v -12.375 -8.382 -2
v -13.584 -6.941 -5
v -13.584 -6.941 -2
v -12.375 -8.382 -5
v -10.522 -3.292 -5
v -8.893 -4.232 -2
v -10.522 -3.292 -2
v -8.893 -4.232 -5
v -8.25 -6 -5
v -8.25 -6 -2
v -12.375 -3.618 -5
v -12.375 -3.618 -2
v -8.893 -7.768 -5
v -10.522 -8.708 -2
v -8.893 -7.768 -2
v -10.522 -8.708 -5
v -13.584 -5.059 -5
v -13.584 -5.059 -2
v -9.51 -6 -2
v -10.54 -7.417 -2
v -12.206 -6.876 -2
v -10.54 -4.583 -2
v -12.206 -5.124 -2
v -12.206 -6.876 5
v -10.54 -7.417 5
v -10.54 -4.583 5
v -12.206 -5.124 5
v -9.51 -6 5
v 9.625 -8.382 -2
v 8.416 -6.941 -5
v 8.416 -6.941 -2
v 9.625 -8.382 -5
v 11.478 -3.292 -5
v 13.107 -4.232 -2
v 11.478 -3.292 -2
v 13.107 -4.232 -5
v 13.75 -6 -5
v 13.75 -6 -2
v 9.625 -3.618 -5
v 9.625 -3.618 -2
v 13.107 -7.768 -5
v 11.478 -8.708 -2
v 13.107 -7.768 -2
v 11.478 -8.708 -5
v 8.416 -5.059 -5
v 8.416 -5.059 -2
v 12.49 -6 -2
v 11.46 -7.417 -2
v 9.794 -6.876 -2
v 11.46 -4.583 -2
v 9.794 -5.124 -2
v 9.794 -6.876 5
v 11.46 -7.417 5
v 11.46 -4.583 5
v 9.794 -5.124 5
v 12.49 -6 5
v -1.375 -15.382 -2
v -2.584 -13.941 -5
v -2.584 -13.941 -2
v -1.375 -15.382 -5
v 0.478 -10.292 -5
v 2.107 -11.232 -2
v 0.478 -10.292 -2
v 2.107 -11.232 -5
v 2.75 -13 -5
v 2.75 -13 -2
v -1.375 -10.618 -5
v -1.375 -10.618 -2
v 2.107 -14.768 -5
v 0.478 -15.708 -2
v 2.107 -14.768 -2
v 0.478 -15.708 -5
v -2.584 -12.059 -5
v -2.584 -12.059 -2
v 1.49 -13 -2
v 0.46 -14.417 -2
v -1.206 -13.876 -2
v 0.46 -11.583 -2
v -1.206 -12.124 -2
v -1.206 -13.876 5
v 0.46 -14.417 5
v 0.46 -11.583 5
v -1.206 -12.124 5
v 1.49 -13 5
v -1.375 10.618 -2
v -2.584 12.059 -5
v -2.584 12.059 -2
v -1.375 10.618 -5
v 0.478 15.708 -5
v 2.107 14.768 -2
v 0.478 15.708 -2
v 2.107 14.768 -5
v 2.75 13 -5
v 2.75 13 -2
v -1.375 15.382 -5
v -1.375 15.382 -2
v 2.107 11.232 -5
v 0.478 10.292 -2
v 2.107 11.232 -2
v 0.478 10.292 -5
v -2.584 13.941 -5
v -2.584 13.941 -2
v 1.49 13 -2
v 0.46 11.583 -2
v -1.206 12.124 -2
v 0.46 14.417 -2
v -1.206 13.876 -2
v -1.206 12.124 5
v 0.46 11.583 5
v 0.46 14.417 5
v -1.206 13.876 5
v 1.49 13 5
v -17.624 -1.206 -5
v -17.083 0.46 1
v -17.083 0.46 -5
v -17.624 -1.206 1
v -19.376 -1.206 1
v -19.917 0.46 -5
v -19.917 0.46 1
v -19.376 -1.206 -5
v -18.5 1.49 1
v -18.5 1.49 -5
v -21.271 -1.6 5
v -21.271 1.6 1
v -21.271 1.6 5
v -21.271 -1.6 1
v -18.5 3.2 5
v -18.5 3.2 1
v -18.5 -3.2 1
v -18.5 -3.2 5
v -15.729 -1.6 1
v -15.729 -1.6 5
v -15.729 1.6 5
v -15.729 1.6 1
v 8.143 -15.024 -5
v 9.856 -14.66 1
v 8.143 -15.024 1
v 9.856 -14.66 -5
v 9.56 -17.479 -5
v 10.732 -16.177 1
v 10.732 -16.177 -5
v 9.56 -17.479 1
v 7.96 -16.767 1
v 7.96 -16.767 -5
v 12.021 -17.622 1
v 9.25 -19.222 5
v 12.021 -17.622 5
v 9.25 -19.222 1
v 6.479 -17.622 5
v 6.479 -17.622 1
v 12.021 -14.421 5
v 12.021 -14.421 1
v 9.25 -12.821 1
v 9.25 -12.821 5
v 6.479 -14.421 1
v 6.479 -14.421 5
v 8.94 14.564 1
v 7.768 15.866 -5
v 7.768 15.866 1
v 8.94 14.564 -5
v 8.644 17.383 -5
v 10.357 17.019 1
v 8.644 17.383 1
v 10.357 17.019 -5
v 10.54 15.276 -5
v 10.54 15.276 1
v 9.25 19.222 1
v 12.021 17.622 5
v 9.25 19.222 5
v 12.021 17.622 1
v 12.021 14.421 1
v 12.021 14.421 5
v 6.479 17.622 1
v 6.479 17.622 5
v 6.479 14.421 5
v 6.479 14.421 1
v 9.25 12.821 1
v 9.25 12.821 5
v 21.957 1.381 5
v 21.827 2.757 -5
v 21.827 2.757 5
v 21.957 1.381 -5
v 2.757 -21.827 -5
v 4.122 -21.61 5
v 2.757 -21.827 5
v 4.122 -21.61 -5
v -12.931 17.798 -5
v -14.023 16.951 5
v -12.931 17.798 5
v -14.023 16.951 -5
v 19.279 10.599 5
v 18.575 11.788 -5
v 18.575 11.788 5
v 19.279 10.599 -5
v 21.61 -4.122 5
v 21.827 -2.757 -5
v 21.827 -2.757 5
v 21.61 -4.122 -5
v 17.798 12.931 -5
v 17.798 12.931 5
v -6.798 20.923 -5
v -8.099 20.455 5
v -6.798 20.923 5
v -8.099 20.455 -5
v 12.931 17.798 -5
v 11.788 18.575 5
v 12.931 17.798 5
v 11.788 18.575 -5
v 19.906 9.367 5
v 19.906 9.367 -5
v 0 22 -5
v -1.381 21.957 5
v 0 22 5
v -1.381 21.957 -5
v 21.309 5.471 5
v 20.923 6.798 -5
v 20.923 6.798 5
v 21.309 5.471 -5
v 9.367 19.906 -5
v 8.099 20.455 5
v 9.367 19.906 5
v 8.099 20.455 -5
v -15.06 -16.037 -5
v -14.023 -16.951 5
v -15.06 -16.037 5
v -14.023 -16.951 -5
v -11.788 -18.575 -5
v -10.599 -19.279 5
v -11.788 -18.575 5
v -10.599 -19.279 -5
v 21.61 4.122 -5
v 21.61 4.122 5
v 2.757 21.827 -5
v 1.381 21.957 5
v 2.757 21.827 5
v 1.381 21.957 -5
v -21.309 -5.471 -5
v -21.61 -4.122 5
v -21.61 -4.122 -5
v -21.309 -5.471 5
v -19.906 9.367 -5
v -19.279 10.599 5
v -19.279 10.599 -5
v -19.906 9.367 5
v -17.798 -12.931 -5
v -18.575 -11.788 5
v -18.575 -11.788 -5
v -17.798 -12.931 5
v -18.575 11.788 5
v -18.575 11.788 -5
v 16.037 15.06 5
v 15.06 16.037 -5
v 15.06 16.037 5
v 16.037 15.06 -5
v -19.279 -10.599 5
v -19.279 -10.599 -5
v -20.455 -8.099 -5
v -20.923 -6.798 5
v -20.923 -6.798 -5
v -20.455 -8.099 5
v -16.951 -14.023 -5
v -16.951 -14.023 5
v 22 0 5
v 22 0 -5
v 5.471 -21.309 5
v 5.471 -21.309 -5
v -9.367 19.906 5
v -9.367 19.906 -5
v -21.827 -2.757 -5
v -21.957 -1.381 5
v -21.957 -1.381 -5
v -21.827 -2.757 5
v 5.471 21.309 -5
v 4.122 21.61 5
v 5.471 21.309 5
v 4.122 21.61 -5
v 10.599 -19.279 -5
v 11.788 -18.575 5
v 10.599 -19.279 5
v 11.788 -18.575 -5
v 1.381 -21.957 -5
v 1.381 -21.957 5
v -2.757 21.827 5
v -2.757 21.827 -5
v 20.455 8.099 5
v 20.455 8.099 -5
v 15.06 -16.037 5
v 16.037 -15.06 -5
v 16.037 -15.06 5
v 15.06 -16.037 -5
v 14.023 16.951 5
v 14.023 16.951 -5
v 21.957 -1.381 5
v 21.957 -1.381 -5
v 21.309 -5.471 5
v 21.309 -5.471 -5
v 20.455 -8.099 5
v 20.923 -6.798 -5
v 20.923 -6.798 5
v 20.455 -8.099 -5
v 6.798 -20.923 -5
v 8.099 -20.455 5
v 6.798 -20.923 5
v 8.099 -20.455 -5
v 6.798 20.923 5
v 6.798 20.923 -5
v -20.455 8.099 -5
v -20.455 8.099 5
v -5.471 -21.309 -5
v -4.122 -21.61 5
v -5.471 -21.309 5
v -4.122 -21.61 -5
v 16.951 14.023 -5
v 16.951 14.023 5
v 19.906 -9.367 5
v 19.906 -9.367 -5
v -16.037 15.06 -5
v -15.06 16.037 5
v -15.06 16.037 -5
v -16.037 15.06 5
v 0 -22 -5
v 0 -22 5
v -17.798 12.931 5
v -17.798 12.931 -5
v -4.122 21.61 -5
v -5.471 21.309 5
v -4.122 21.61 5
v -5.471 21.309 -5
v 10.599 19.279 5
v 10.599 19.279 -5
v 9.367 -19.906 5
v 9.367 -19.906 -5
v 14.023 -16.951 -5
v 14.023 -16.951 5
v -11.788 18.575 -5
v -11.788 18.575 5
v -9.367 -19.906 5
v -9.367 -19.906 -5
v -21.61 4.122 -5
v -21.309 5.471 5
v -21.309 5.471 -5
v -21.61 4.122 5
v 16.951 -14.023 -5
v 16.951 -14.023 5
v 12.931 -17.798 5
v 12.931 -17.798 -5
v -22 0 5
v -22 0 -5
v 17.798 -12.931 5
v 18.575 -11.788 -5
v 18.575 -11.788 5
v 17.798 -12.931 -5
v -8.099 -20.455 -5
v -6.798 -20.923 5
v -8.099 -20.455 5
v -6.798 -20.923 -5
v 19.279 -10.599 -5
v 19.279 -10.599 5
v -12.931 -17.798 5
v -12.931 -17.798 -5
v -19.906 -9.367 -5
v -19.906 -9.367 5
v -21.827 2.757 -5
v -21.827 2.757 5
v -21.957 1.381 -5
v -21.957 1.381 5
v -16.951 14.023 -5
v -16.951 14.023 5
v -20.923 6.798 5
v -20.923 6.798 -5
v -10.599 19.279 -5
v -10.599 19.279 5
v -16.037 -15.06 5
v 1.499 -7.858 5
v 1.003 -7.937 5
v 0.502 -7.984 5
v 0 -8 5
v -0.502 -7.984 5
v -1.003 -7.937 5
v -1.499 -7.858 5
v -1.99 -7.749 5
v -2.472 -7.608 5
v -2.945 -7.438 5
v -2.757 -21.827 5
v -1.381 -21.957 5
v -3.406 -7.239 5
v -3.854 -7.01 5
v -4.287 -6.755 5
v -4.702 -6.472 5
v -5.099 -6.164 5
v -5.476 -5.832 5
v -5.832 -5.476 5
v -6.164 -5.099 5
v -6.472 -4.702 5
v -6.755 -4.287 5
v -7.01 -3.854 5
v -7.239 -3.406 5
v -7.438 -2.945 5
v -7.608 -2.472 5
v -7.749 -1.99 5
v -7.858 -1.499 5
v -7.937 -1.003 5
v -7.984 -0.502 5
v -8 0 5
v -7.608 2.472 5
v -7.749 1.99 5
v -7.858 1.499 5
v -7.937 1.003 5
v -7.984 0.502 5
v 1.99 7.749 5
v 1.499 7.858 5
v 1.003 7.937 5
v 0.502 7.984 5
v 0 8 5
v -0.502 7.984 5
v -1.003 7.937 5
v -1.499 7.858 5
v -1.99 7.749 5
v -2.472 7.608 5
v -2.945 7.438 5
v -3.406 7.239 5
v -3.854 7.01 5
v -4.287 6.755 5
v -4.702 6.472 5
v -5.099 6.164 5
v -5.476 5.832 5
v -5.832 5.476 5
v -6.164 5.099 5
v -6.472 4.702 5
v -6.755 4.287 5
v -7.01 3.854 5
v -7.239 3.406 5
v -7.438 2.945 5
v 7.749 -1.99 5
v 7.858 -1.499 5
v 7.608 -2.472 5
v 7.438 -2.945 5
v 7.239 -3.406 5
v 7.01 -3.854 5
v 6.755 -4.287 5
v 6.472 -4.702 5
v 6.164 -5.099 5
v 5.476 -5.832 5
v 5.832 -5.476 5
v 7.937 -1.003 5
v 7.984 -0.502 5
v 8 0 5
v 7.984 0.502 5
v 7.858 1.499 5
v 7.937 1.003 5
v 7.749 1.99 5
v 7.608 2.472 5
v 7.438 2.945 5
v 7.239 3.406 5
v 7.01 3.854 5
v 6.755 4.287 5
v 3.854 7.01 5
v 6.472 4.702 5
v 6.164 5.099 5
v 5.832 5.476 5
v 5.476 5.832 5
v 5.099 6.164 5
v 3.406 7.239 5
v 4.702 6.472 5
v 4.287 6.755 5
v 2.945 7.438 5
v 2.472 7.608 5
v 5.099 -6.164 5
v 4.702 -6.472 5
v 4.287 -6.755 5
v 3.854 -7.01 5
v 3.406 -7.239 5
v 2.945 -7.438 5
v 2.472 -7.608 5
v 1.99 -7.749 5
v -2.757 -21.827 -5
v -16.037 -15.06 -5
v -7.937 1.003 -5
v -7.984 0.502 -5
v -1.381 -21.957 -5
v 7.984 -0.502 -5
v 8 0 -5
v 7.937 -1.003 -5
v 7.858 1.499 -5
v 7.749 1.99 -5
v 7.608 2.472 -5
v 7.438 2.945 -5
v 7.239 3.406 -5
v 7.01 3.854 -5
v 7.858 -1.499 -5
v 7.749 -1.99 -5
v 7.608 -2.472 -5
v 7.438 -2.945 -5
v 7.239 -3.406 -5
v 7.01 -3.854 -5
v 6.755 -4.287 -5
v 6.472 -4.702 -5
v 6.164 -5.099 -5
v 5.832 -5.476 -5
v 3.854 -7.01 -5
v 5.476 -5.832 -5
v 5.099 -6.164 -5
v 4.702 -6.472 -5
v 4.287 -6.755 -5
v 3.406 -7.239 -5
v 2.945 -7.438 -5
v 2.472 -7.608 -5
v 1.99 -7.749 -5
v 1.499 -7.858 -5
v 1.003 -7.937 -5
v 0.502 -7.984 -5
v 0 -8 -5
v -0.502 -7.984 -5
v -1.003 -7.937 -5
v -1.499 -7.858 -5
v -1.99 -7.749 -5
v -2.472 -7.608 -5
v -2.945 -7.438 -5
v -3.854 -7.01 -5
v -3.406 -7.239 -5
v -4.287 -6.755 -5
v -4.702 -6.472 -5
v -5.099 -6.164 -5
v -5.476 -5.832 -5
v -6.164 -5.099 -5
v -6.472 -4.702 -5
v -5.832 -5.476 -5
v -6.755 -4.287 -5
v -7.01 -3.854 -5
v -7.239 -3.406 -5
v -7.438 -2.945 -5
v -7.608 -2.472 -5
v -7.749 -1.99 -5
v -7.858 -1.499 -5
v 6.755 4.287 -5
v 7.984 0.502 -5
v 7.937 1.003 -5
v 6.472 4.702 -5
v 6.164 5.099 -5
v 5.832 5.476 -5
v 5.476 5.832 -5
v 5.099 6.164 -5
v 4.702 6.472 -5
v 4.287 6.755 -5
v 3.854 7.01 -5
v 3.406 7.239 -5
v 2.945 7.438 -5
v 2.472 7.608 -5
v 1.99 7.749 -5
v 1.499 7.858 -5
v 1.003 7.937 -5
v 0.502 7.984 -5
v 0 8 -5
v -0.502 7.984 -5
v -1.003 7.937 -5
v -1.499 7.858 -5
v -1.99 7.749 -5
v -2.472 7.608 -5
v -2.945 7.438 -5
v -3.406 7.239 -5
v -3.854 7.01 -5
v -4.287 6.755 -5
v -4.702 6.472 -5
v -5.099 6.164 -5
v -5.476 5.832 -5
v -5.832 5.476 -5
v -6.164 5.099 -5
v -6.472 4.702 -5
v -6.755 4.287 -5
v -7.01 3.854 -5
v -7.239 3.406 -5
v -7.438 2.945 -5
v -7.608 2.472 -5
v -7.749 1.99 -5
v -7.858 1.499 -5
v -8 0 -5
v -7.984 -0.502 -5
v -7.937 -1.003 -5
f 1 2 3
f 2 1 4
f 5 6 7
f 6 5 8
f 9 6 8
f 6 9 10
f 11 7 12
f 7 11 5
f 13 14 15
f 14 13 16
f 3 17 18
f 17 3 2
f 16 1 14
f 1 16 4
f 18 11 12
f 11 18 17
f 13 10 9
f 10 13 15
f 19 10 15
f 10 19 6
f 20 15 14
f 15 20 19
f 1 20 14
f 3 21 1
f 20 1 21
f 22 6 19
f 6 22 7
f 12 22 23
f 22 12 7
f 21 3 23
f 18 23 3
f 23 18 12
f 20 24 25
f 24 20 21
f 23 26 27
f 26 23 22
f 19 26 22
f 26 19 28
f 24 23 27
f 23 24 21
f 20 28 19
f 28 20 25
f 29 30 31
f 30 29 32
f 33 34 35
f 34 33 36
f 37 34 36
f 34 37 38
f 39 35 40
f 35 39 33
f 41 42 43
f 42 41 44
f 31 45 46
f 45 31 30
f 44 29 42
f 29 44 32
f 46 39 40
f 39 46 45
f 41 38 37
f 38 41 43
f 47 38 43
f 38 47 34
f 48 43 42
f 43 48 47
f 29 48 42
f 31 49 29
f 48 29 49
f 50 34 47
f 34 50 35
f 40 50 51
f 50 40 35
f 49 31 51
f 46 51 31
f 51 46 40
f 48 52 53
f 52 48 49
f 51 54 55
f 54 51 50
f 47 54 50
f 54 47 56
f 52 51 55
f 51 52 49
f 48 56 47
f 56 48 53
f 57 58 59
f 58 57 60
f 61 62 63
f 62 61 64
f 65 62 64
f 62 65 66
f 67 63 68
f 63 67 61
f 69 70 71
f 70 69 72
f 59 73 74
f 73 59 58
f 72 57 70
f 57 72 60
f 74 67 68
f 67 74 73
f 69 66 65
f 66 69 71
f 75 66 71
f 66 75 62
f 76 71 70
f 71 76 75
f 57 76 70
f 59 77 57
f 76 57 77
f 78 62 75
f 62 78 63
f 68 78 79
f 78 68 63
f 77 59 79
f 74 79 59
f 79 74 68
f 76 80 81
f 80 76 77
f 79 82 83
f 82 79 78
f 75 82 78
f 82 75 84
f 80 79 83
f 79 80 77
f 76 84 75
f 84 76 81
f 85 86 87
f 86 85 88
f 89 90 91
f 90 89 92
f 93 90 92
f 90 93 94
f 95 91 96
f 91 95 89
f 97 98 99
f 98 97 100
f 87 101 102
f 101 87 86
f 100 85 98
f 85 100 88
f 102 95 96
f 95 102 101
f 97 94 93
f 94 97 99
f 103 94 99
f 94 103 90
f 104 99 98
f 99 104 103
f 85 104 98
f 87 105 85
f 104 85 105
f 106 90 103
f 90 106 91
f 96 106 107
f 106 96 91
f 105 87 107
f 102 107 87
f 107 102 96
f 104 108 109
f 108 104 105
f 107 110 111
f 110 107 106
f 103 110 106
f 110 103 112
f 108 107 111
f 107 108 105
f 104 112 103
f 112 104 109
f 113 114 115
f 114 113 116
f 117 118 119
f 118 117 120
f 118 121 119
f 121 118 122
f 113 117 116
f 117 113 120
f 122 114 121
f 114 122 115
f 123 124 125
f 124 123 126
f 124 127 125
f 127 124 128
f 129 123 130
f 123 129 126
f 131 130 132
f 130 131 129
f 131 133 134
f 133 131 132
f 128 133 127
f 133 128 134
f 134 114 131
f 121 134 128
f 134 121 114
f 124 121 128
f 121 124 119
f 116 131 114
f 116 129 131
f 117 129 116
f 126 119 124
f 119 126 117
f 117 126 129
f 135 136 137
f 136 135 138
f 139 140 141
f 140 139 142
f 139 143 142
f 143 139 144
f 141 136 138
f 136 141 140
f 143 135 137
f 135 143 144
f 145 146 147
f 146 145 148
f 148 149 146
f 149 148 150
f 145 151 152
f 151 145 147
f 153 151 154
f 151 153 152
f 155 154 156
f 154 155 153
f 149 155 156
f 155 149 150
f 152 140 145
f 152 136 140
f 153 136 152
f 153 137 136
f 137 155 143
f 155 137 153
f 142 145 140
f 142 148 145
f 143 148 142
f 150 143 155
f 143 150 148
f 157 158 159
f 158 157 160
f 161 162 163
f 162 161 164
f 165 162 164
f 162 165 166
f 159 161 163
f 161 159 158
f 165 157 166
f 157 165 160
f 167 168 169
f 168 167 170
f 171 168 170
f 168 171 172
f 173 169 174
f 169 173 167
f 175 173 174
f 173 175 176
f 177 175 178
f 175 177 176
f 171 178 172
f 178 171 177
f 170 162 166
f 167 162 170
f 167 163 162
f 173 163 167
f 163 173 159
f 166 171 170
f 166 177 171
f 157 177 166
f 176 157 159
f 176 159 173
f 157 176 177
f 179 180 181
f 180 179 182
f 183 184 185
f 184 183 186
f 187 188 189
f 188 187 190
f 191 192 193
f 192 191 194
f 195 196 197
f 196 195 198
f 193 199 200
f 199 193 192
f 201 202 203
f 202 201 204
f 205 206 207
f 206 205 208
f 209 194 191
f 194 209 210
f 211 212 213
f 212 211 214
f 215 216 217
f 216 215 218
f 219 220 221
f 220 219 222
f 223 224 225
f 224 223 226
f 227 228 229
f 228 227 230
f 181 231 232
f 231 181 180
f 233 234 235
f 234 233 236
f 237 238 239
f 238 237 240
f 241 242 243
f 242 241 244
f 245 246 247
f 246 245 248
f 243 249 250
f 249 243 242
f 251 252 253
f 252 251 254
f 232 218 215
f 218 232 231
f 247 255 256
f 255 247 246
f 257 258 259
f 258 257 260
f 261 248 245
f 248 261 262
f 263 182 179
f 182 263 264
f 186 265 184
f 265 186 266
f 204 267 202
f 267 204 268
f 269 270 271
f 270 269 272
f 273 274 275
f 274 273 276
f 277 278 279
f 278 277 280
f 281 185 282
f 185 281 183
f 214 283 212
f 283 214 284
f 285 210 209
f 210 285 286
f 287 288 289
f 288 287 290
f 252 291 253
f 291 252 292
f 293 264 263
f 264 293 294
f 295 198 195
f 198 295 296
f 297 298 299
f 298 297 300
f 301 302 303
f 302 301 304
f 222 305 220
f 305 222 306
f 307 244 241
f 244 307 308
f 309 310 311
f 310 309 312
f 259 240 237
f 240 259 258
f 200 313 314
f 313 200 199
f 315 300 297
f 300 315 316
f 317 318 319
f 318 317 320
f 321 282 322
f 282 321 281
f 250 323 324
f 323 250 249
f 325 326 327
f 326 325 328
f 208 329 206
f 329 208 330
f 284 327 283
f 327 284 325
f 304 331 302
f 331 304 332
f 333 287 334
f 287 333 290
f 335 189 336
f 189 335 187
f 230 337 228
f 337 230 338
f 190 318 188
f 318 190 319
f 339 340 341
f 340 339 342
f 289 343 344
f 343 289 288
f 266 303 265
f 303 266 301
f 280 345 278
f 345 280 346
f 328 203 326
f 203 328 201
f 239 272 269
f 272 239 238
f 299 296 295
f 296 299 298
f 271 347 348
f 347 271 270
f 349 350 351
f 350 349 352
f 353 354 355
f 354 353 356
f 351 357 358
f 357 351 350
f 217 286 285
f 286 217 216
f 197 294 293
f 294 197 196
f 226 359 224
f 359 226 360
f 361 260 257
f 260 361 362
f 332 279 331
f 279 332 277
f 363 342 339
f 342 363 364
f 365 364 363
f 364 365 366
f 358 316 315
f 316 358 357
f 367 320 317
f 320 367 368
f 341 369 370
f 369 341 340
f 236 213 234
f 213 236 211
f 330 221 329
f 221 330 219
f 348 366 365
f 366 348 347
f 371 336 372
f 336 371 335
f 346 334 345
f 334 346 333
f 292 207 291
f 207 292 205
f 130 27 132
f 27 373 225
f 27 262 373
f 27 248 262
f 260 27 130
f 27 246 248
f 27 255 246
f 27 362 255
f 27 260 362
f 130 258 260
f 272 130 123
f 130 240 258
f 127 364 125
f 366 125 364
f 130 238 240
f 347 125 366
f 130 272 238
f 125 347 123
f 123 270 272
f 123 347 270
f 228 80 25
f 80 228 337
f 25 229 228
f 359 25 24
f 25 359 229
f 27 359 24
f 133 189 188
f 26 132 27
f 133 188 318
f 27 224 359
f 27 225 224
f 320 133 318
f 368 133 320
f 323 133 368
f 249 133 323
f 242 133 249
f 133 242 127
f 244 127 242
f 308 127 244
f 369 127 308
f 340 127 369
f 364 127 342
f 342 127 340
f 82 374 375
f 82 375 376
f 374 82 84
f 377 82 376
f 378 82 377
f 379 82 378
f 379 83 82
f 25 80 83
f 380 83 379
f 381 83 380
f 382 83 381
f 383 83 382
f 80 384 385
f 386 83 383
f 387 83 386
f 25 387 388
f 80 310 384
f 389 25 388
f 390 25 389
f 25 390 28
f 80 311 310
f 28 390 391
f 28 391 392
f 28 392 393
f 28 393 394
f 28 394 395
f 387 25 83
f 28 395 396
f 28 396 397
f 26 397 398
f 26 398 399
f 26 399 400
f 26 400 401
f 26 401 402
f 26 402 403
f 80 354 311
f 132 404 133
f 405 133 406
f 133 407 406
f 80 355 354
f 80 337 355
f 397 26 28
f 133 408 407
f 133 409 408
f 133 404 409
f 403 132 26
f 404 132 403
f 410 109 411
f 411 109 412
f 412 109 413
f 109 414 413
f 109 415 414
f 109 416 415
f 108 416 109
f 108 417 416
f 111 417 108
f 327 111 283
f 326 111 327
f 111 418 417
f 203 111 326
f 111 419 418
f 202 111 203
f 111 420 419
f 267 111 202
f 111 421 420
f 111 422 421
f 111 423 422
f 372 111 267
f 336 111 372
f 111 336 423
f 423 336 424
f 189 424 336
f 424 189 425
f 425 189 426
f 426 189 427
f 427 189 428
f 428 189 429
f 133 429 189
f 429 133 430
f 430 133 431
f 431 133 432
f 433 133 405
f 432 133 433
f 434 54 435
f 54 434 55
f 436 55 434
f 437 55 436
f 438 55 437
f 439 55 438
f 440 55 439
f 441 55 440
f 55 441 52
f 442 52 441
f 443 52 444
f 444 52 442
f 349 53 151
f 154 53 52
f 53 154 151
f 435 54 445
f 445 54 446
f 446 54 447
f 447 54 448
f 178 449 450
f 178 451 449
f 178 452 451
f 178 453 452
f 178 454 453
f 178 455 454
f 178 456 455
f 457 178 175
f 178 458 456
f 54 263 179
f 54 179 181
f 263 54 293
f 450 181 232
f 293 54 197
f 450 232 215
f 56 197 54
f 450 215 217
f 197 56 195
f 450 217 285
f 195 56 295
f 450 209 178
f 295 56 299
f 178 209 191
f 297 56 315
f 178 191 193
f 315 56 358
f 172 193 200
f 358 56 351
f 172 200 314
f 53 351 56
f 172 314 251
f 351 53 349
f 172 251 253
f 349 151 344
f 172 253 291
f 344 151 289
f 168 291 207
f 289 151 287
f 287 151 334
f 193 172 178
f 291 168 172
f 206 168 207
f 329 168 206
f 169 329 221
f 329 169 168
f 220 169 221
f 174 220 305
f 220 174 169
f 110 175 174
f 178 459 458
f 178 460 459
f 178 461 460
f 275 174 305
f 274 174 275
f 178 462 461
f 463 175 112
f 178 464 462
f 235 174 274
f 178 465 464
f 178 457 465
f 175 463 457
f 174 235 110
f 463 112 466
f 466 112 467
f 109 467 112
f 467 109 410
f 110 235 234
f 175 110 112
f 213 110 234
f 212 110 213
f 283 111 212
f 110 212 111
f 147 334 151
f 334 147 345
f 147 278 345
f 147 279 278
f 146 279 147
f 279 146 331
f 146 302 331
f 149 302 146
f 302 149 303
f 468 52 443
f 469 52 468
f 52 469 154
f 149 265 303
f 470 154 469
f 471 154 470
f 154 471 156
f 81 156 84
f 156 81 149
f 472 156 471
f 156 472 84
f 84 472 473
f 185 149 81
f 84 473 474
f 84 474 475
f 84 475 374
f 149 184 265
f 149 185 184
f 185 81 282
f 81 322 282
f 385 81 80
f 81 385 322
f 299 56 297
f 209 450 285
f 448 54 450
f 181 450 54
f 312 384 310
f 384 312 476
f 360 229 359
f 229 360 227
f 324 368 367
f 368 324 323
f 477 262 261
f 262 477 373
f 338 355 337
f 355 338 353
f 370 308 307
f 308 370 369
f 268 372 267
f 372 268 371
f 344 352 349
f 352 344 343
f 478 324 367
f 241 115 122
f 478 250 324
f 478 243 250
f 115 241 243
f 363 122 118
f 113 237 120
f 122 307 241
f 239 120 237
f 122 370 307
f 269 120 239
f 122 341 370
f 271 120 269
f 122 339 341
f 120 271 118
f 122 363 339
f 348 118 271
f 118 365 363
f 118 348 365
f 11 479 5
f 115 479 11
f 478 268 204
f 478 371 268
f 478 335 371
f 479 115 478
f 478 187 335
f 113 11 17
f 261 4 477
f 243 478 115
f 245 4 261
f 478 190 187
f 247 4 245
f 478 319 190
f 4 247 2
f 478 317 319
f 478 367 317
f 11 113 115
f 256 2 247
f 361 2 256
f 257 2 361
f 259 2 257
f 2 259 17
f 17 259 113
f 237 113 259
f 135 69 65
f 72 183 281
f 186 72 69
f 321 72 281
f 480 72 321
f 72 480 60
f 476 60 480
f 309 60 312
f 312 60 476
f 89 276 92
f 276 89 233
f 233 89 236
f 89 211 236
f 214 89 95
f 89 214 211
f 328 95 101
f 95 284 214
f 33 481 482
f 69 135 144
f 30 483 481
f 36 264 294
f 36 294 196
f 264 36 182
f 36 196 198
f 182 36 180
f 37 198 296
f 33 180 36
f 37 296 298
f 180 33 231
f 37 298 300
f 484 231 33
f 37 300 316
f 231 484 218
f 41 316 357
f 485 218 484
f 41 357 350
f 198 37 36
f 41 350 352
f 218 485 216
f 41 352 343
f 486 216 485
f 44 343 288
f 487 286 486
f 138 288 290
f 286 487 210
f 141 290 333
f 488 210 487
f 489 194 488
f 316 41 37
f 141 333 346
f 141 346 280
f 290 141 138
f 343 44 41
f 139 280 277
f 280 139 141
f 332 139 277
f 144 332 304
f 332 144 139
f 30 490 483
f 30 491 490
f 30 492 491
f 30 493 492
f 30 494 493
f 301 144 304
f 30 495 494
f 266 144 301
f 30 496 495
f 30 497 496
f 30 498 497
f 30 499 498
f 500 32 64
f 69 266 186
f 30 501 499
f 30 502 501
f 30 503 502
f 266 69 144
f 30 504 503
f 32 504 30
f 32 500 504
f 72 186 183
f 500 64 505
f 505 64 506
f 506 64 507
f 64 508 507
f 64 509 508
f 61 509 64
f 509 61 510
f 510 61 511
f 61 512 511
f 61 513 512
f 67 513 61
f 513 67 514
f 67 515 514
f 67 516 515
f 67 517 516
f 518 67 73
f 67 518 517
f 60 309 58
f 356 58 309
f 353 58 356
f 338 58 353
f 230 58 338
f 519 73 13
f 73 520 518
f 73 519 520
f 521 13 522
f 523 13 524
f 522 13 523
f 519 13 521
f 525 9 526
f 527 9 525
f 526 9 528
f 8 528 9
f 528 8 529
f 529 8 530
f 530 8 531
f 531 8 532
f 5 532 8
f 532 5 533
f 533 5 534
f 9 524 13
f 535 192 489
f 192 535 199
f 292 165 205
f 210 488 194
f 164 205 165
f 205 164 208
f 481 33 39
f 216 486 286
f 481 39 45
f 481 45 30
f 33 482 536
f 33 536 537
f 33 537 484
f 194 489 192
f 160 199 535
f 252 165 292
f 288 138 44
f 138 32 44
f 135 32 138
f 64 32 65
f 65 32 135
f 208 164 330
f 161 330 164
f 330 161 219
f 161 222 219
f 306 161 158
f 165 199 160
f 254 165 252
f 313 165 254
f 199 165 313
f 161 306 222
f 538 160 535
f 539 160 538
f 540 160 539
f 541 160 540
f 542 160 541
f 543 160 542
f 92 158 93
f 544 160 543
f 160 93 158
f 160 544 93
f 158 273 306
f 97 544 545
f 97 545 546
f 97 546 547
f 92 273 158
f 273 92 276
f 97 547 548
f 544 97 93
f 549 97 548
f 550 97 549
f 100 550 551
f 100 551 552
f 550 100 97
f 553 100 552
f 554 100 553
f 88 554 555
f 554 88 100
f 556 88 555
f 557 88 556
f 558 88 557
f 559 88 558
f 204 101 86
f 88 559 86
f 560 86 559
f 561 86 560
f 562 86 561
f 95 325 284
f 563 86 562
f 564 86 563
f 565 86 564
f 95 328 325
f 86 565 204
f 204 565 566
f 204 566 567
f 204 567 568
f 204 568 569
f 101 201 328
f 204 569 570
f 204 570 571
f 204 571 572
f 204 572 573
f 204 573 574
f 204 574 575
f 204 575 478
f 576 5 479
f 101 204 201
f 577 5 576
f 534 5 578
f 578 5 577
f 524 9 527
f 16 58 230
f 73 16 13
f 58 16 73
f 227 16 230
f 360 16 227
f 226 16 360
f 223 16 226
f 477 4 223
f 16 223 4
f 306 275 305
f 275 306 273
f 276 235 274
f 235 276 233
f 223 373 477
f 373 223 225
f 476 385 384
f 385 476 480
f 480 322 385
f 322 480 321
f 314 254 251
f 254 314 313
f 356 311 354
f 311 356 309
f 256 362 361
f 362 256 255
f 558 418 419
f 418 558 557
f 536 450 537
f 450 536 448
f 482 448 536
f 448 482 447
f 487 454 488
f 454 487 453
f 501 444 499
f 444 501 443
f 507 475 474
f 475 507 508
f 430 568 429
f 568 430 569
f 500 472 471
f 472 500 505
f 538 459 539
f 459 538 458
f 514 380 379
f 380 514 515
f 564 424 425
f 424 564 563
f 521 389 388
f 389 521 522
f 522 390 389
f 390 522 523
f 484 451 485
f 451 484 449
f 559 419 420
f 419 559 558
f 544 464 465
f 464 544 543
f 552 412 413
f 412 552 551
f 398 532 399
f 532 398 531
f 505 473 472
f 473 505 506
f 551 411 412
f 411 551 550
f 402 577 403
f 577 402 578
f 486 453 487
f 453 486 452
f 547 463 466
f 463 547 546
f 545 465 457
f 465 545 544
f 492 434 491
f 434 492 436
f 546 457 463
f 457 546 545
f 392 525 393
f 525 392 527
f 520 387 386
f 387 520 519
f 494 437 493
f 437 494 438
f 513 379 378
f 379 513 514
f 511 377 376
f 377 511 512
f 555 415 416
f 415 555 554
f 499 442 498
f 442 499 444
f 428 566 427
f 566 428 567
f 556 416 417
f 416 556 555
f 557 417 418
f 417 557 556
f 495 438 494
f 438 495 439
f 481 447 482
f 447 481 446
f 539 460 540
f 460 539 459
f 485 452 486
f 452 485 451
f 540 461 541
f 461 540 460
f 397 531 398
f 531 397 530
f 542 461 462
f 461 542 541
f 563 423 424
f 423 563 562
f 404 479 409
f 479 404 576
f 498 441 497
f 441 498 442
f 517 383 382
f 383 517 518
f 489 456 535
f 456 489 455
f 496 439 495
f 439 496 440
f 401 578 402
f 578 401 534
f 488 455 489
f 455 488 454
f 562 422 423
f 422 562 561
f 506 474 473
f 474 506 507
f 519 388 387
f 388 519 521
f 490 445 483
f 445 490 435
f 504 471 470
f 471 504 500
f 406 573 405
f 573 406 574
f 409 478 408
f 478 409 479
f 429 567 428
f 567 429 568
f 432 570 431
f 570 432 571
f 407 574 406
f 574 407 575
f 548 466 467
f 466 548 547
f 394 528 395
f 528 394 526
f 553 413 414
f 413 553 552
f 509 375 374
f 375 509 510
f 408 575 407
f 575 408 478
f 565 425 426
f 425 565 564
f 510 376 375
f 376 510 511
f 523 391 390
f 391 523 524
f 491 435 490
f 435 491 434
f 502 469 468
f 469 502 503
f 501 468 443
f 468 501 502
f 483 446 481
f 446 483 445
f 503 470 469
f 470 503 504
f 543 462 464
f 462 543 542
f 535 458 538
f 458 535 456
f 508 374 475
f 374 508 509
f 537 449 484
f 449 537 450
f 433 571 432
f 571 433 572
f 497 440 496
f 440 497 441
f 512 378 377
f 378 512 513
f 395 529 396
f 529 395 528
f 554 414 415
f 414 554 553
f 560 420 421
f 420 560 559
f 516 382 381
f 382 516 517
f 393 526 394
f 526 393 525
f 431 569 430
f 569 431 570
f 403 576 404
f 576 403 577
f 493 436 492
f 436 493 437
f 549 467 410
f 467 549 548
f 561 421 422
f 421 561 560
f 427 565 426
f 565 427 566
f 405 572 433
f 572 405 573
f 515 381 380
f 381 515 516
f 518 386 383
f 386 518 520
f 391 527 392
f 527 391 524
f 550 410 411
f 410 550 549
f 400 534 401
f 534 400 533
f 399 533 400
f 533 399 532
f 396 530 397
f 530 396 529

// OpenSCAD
// file: ../MCAD/nuts_and_bolts.scad
// Copyright 2010 D1plo1d

// This library is dual licensed under the GPL 3.0 and the GNU Lesser General Public License as per http://creativecommons.org/licenses/LGPL/2.1/ .

//testNutsAndBolts();

module testNutsAndBolts()
{
  p = -1;
  
	$fn = 360;
	translate([0,15]) 
    nutHole(3, proj=p);
  
	boltHole(3, length= 30, proj=p);
}

MM = "mm";
INCH = "inch"; //Not yet supported

//Based on: http://www.roymech.co.uk/Useful_Tables/Screws/Hex_Screws.htm
// width across corners
METRIC_NUT_AC_WIDTHS =
[
	-1, //0 index is not used but reduces computation
	-1,
	4.38,//m2
	6.40,  //m3
	8.10,  //m4
	9.20,  //m5
	11.50, //m6
	-1,
	15.00, //m8
	-1,
	19.60, //m10
	-1,
	22.10, //m12
	-1,
	-1,
	-1,
	27.70,//m16
	-1,
	-1,
	-1,
	34.60,//m20
	-1,
	-1,
	-1,
	41.60,//m24
	-1,
	-1,
	-1,
	-1,
	-1,
	53.1,//m30
	-1,
	-1,
	-1,
	-1,
	-1,
	63.5//m36
];

METRIC_NUT_THICKNESS =
[
	-1, //0 index is not used but reduces computation
	-1,
	1.6,//m2
	2.40,  //m3
	3.20,  //m4
	4.00,  //m5
	5.00,  //m6
	-1,
	6.50,  //m8
	-1,
	8.00,  //m10
	-1,
	10.00, //m12
	-1,
	-1,
	-1,
	13.00,//m16
	-1,
	-1,
	-1,
	16.00//m20
	-1,
	-1,
	-1,
	19.00,//m24
	-1,
	-1,
	-1,
	-1,
	-1,
	24.00,//m30
	-1,
	-1,
	-1,
	-1,
	-1,
	29.00//m36
];

COARSE_METRIC_BOLT_MAJOR_THREAD_DIAMETERS =
[//based on max values
	-1, //0 index is not used but reduces computation
	-1,
	1.6,//m2
	2.98,  //m3
	3.978, //m4
	4.976, //m5
	5.974, //m6
	-1,
	7.972,//m8
	-1,
	9.968,//m10
	-1,
	11.966,//m12
	-1,
	-1,
	-1,
	15.962,//m16
	-1,
	-1,
	-1,
	19.958,//m20
	-1,
	-1,
	-1,
	23.952,//m24
	-1,
	-1,
	-1,
	-1,
	-1,
	29.947,//m30
	-1,
	-1,
	-1,
	-1,
	-1,
	35.940//m36
];

// socket_size [J]
// head height [H]
// head_diam   [A]
// socket len  [K]
 
index_socket_size_J = 0; // size of hex driver 
index_head_height_H = 1; // height of cap head
index_head_diam_A   = 2; // diameter of cap head
index_socket_len_K  = 3; // depth of hex socket

METRIC_CAP_SCREW_SIZES =
[
	[-1, -1],    //0 index is not used but reduces computation
	[-1, -1],
	[1.5, 2, 3.8,  1],    //M2
	[2.5, 3, 5.5,  1.3],  //m3
	[3,   4, 7.0,  2.0],  //m4
	[4,   5, 8.5,  2.7],  //m5
	[5,   6,  10,  3.3],  //m6
	[-1, -1],
	[6,   8,  13,  4.3],  //m8
	[-1,  -1],
	[8,  10,  16,  5],    //m10
	[-1,  -1],
	[10, 12,  18,  6],    //m12
	[-1,  -1],
	[-1,  -1],    // M14
	[-1,  -1],
	[14.0, -1],   //m16
	[-1,  -1],
	[-1,  -1],
	[-1,  -1],
	[17.0, -1],   //m20
	[-1,  -1],
	[-1,  -1],
	[-1,  -1],
	[19.0, -1],   //m24
	[-1,  -1],
	[-1,  -1],
	[-1,  -1],
	[-1,  -1],
	[-1,  -1],
	[-1,  -1],    //m30
	[-1,  -1],
	[-1,  -1],
	[-1,  -1],
	[-1,  -1],
	[-1,  -1],
	[-1,  -1]     //m36
];


module nutHole(size, units=MM, tolerance = +0.0001, proj = -1)
{
	//takes a metric screw/nut size and looks up nut dimensions
  
	radius = METRIC_NUT_AC_WIDTHS[size]/2+tolerance;
	height = METRIC_NUT_THICKNESS[size]+tolerance;
  
	if (proj == -1)
	{
		cylinder(r= radius, h=height, $fn = 6, center=[0,0]);
	}
  
	else if (proj == 1)
	{
		circle(r= radius, $fn = 6);
	}
  
	else if (proj == 2)
	{
		translate([-radius/2, 0])
			square([radius*2, height]);
	}
}

module boltHole(size, units=MM, length, tolerance = +0.0001, proj = -1)
{
	radius = COARSE_METRIC_BOLT_MAJOR_THREAD_DIAMETERS[size]/2+tolerance;
  
//TODO: proper screw cap values
	capHeight = METRIC_CAP_SCREW_SIZES[size][index_head_height_H]+tolerance;
	capRadius = METRIC_CAP_SCREW_SIZES[size][index_head_diam_A]/2+tolerance;

	if (proj == -1)
	{
	  translate([0, 0, -capHeight])
		  cylinder(r= capRadius, h=capHeight);
	  cylinder(r = radius, h = length);
	}
  
	else if (proj == 1)
	{
		circle(r = radius);
	}
  
	else if (proj == 2)
	{
		translate([-capRadius/2, -capHeight])
			square([capRadius*2, capHeight]);
		square([radius*2, length]);
	}
}
// main file
use <../MCAD/nuts_and_bolts.scad>;

offset = 22;  // Same as DELTA_EFFECTOR_OFFSET in Marlin.
height=10;
m3_radius=1.5;
m3_nut_radius=1.7;
m3_wide_radius=1.6;
separation=44;
mount_radius = 18.5;  // Hotend mounting screws, standard would be 25mm.
hotend_radius = 8;  // Hole for the hotend (J-Head diameter is 16mm).
mount_space=23/2;

module bolt(thesize,thelength)
{
    boltHole(thesize, length=thelength);
    %boltHole(thesize, length=thelength);
}

module adapter()
{
  difference(){
    cylinder(r=offset, h=height, center=true, $fn=100);
    cylinder(r=hotend_radius, h=height+1, center=true,$fn=100);
    translate([-11,-6, -2])  bolt(3, 20);
    translate([ 11,-6, -2])  bolt(3, 20);
    translate([  0,-13,-2])  bolt(3, 20);
    translate([  0, 13,-2])  bolt(3, 20);
    for (a = [0:120:359]) rotate([0, 0, a+90]) {
      translate([0, mount_radius, -17]) bolt(3,22); 
      translate([0, mount_radius,  height/2-2]) nutHole(3.1);
      translate([0, mount_radius,  height/2-4]) nutHole(3.1);      
    }
   }
 }
 
 //projection() translate([0,0,5]) adapter();
 adapter();
